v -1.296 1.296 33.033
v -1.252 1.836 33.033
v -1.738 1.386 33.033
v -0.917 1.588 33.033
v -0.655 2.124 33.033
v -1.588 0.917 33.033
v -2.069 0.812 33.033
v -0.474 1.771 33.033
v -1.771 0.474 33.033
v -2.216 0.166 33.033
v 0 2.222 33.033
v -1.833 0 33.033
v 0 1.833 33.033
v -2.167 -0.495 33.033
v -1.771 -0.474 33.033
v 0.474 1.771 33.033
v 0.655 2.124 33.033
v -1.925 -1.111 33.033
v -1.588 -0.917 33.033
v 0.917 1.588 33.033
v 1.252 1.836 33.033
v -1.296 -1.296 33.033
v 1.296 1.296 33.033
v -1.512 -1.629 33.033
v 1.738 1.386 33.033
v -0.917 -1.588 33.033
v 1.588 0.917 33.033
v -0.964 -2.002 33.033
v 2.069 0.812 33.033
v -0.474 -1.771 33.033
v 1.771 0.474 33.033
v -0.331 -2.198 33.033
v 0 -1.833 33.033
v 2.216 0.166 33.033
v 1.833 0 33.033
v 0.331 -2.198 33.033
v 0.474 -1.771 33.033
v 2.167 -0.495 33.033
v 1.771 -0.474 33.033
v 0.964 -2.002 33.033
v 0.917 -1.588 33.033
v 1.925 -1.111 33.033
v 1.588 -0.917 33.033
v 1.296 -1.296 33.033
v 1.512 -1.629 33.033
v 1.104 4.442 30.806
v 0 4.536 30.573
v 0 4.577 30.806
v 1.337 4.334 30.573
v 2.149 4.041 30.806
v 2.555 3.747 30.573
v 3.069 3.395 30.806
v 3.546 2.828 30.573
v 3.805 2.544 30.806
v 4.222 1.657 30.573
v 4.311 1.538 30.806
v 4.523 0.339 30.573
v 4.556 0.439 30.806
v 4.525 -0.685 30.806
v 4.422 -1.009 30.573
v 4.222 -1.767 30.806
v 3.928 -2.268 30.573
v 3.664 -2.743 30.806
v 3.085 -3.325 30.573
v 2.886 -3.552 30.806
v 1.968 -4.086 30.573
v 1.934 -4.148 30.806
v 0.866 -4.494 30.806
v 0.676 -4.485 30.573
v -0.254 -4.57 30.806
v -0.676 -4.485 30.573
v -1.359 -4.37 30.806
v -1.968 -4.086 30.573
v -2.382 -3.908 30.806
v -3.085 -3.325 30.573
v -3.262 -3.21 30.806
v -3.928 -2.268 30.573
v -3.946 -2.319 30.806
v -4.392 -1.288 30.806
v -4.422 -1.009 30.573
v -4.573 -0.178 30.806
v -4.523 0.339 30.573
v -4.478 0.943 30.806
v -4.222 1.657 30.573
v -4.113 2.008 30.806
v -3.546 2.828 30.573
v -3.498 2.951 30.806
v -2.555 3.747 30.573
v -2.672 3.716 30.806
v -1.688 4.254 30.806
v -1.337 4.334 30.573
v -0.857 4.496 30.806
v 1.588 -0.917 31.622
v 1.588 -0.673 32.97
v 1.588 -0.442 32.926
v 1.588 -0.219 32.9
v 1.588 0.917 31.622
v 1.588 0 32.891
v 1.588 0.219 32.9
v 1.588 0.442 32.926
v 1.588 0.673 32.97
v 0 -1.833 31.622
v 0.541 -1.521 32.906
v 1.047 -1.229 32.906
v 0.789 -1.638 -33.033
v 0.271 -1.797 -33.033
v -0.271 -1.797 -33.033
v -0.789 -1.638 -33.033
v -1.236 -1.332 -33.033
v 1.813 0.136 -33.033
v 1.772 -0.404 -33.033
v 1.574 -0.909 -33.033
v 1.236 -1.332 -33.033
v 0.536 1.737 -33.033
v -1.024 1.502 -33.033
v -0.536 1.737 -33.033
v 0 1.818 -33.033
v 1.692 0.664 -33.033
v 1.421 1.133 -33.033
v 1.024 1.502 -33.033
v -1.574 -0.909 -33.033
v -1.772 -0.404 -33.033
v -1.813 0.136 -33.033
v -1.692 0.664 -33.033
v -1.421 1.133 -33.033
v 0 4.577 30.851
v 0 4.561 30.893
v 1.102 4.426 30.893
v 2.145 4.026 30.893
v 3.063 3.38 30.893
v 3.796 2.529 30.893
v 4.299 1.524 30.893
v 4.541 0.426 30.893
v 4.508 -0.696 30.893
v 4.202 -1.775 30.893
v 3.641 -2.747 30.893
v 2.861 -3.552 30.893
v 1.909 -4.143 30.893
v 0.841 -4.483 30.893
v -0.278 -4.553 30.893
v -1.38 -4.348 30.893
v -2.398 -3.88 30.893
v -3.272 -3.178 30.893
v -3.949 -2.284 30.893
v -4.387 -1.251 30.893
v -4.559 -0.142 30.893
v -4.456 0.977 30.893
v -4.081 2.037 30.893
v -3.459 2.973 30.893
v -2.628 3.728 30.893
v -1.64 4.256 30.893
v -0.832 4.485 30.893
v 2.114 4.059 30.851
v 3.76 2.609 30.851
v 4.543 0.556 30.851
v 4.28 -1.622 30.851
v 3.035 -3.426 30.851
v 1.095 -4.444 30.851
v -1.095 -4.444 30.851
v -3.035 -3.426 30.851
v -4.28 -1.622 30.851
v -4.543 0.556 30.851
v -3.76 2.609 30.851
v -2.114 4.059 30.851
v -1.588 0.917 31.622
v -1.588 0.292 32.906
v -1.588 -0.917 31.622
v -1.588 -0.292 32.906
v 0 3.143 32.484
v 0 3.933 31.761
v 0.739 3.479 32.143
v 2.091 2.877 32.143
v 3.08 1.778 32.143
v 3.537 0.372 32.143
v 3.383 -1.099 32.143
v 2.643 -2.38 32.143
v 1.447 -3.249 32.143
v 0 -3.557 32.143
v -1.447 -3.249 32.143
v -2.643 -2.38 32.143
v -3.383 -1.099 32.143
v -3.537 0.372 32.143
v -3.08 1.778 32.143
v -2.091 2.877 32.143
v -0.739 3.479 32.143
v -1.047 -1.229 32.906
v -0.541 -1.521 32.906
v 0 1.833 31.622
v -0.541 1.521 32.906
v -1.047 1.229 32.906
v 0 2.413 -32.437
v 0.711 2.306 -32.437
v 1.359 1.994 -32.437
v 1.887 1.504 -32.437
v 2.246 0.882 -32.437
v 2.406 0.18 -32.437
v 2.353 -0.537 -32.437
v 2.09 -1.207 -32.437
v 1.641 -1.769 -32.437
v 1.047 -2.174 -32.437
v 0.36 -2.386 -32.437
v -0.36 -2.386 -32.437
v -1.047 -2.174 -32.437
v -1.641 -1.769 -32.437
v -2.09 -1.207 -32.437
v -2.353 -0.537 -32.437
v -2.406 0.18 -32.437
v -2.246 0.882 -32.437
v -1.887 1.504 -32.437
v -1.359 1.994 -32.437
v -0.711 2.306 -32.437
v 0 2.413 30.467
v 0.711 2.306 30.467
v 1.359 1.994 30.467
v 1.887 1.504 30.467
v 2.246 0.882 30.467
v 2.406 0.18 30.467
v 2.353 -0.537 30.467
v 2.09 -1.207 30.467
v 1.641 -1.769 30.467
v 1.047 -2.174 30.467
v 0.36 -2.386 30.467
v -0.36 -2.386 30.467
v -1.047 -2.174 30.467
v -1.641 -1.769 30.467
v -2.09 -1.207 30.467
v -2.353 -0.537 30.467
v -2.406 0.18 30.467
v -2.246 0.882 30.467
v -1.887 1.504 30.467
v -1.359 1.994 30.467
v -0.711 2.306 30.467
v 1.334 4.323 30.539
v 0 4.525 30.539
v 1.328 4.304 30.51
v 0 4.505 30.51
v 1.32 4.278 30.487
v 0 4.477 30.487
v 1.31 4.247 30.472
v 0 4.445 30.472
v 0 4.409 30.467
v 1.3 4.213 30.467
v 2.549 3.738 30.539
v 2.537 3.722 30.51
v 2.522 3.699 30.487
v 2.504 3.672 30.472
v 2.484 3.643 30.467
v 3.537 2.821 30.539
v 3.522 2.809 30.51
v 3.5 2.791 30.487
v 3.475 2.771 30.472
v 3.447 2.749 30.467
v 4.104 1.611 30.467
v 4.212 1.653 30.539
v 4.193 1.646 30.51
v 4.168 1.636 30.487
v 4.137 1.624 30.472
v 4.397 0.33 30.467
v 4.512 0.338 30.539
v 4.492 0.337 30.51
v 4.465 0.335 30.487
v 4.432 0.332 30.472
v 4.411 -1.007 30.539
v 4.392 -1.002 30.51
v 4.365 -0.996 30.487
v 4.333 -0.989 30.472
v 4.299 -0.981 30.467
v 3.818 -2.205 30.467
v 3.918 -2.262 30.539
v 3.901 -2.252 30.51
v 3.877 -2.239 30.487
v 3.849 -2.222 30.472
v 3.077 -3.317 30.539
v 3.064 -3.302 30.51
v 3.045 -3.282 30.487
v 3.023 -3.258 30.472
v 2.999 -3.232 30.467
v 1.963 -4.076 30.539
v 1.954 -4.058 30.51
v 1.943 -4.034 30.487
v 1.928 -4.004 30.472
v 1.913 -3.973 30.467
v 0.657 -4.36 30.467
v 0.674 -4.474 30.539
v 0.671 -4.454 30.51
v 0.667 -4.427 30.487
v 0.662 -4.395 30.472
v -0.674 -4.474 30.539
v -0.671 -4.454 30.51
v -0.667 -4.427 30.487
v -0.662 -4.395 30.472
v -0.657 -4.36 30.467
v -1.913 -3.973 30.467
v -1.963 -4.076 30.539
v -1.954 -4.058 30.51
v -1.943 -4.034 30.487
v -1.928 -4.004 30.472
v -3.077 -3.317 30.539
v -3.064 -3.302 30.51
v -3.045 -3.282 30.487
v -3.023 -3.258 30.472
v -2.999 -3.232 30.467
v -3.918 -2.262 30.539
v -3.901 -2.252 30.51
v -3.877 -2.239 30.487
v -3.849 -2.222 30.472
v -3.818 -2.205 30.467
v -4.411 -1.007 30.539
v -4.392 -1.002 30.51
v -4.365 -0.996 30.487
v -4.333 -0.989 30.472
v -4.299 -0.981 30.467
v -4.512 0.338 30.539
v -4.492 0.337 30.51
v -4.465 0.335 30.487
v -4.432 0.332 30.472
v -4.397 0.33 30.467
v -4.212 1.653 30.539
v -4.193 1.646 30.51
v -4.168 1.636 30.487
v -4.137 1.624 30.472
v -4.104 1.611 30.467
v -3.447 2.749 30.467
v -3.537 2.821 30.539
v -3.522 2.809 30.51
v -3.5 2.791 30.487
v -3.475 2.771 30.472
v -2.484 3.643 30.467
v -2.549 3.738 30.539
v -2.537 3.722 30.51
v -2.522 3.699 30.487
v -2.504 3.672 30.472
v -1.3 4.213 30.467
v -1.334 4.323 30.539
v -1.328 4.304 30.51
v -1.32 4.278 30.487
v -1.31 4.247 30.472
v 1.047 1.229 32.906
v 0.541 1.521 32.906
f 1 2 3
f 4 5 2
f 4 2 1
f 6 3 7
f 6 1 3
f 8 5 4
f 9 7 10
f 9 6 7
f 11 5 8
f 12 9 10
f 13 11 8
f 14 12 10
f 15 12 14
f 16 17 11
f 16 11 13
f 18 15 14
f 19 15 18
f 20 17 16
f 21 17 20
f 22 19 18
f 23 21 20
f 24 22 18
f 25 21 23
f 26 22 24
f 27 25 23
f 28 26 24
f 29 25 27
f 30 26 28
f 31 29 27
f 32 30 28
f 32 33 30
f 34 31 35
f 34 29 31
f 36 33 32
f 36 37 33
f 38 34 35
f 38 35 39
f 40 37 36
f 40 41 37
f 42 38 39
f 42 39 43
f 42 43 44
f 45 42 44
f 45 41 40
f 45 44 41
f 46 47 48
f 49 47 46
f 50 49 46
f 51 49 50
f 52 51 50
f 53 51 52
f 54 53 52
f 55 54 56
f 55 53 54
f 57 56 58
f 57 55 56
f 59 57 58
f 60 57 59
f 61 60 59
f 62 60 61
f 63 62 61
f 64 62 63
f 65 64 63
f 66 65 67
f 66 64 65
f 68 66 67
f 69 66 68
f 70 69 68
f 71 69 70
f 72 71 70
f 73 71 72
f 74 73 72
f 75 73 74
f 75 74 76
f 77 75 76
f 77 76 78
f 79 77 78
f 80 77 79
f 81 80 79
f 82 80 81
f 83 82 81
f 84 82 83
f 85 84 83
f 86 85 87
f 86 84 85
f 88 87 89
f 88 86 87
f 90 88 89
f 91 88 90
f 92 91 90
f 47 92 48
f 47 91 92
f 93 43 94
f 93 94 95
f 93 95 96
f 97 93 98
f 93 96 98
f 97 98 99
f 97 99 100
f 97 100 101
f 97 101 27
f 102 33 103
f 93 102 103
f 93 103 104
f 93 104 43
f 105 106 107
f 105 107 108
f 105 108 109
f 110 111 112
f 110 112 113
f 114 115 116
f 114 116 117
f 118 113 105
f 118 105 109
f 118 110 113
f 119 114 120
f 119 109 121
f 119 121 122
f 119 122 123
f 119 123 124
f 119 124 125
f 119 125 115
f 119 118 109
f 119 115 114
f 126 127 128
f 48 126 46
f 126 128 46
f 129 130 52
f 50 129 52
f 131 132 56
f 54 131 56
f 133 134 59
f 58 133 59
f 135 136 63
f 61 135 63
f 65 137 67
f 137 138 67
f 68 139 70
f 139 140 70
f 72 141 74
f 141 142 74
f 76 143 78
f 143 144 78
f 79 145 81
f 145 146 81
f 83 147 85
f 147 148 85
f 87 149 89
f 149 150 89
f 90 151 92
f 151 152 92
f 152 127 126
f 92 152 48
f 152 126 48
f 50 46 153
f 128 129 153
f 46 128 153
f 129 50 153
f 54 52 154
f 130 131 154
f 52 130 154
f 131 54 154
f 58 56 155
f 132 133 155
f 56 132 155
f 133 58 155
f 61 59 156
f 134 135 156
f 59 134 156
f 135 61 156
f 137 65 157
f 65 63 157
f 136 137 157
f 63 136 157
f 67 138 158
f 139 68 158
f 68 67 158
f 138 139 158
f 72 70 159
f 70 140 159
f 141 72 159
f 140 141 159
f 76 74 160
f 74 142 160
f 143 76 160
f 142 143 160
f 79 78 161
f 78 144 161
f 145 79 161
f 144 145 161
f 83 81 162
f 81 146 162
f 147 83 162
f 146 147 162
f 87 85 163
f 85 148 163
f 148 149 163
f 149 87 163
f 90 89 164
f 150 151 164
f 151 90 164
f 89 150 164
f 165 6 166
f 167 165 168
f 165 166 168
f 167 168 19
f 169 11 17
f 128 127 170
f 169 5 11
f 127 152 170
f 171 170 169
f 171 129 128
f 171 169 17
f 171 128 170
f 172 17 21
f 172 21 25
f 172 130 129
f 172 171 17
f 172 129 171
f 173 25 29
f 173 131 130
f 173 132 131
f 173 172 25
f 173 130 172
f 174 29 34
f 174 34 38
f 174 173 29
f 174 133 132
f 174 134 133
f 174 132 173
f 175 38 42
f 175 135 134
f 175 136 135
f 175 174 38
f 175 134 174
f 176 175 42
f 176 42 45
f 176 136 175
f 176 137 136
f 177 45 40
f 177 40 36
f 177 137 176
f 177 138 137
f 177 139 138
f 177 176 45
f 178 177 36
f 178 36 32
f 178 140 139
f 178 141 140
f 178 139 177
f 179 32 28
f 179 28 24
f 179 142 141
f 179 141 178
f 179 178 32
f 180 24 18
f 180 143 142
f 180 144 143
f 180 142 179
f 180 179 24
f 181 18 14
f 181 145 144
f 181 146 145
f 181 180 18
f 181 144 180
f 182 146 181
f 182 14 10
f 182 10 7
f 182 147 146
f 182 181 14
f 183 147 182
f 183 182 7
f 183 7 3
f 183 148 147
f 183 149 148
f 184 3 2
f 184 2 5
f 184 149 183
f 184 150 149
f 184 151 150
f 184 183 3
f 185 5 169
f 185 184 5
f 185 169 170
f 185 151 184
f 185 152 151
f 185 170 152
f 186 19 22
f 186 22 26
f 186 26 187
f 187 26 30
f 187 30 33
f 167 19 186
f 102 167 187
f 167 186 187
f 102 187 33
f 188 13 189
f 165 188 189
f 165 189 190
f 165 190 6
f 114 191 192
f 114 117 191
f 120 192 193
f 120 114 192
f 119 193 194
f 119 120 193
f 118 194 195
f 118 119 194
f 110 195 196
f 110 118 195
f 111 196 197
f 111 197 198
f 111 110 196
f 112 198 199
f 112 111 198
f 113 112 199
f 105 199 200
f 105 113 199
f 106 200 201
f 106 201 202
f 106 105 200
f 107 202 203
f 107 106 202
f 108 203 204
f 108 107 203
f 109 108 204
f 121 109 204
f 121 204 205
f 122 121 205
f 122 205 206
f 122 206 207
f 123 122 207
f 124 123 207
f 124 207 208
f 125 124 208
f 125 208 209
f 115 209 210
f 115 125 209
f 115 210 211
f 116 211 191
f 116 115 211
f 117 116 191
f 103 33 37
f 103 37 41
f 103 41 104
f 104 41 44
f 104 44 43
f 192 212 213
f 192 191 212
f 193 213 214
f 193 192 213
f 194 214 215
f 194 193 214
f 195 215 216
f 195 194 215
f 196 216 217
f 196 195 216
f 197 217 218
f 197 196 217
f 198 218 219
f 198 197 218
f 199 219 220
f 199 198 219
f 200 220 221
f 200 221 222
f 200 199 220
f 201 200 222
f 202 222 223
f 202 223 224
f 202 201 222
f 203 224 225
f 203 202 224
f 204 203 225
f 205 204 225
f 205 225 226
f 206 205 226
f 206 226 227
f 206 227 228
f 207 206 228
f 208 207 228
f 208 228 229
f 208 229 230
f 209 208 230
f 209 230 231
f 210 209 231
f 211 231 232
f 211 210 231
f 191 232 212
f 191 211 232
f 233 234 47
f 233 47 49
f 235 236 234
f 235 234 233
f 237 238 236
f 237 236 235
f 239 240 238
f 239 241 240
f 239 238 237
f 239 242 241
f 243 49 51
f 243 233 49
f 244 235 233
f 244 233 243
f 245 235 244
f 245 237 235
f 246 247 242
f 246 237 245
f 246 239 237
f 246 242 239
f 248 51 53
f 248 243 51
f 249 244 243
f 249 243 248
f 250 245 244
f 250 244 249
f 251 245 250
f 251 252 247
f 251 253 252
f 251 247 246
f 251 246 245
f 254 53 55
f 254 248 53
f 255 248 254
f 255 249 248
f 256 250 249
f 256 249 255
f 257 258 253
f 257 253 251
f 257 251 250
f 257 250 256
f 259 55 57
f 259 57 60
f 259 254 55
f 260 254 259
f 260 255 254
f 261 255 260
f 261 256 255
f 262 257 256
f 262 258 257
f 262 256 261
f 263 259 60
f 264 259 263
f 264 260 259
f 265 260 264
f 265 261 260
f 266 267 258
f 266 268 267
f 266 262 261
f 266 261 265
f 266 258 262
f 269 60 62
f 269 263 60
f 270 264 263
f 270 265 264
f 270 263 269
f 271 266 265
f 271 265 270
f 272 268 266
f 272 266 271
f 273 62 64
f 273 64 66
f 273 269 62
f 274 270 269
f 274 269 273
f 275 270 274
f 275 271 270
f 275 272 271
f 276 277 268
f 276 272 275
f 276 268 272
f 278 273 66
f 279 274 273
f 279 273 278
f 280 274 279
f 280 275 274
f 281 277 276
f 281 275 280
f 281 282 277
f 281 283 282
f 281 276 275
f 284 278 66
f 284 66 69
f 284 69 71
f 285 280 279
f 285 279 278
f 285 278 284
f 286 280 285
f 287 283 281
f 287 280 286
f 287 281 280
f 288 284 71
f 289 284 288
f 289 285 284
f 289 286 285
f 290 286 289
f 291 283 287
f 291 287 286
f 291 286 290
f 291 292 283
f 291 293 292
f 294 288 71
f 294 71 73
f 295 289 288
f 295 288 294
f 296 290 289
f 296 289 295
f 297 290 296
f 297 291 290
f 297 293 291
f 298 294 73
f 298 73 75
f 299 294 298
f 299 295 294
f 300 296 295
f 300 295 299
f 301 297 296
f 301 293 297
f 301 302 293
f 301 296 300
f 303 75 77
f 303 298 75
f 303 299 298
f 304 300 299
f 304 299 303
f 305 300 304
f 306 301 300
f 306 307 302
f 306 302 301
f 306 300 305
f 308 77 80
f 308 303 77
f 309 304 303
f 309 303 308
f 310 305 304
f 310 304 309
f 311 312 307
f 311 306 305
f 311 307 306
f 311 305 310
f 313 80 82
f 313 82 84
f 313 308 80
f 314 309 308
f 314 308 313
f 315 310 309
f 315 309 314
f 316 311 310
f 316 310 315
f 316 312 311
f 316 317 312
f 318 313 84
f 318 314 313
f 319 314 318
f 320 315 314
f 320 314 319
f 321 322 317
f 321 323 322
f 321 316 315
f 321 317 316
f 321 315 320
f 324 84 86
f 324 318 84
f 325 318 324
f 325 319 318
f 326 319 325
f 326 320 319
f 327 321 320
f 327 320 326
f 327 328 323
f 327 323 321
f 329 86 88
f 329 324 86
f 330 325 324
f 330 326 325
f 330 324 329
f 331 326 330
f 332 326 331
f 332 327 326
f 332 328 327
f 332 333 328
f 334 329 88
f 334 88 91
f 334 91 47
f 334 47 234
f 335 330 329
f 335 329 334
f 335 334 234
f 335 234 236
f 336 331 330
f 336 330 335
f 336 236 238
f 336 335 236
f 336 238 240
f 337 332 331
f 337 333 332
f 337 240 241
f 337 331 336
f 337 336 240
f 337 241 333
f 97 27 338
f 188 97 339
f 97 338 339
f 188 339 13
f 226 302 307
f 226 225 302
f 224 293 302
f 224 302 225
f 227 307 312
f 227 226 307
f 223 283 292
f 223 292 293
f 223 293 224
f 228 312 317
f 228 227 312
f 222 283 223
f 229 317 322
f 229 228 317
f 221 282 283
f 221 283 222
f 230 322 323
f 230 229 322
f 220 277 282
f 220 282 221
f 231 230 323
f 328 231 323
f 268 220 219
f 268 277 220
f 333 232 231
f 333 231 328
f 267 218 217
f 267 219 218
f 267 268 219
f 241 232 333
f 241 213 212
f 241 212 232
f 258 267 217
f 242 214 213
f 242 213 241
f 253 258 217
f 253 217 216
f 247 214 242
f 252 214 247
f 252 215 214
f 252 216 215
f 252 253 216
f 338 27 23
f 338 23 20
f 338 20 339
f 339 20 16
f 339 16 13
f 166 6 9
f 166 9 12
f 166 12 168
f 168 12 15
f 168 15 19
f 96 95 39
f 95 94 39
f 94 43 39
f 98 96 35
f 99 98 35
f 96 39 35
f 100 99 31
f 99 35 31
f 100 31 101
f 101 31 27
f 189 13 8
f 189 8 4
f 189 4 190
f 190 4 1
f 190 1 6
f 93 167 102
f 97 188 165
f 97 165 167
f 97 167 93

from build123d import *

# Parameters (mm, degrees)
CUT_EXTRUDE1_DEPTH = 1.41097
SKETCH5_R          = 1.833087105
CUT_EXTRUDE2_DEPTH = 1.41097
CUT_EXTRUDE2_DRAFT = -60
FILLET1_R          = 0.12827


with BuildPart() as part:
    # Sketch3 → Revolve1 (revolve)
    with BuildSketch(Plane(origin=(0, 0, 0), x_dir=(0, 0, -1), z_dir=(1, 0, 0))):
        with BuildLine():
            Line((-33.0327, 0), (-33.0327, 2.2225))
            ThreePointArc((-33.0327, 2.2225), (-32.12696038, 3.573966445), (-30.85211, 4.5847))
            Line((-30.85211, 4.5847), (-30.4673, 4.516847615))
            Line((-30.4673, 4.516847615), (-30.4673, 2.413))
            Line((-30.4673, 2.413), (32.4373875, 2.413))
            Line((32.4373875, 2.413), (33.0327, 1.8176875))
            Line((33.0327, 1.8176875), (33.0327, 0))
            Line((33.0327, 0), (-33.0327, 0))
        make_face()
    revolve(axis=Axis((0, 0, 33.0327), (0, 0, -1)))

    # Sketch4 → Cut-Extrude1 (cut)
    with BuildSketch(Plane.XY.offset(33.0327)):
        Polygon((-1.5875, -0.916543552), (0, -1.833087105), (1.5875, -0.916543552), (1.5875, 0.916543552), (0, 1.833087105), (-1.5875, 0.916543552), align=None)
    extrude(amount=-CUT_EXTRUDE1_DEPTH, mode=Mode.SUBTRACT)


with BuildPart() as cut_extrude2_tool:
    # Sketch5 → Cut-Extrude2 (with draft: the straight prism first)
    with BuildSketch(Plane.XY.offset(33.0327)):
        Circle(SKETCH5_R)
    extrude(amount=-CUT_EXTRUDE2_DEPTH)
    # Cut-Extrude2: the draft: its side faces are tilted about the plane it starts from
    cut_extrude2_sides = [cut_extrude2_tool.faces().sort_by_distance(p)[0] for p in [
        (-1.833087105, 0, 32.327215),
    ]]
    draft(cut_extrude2_sides, Plane.XY.offset(33.0327), CUT_EXTRUDE2_DRAFT)


with BuildPart() as part_1:
    add(part.part)

    # Cut-Extrude2: cut by cut_extrude2_tool
    add(cut_extrude2_tool.part, mode=Mode.SUBTRACT)

    # Fillet1
    fillet1_edges = [part_1.edges().sort_by_distance(p)[0] for p in [
        (0, -4.516847615, 30.4673),
        (0, -4.5847, 30.85211),
    ]]
    fillet(fillet1_edges, radius=FILLET1_R)


solid = part_1.part
